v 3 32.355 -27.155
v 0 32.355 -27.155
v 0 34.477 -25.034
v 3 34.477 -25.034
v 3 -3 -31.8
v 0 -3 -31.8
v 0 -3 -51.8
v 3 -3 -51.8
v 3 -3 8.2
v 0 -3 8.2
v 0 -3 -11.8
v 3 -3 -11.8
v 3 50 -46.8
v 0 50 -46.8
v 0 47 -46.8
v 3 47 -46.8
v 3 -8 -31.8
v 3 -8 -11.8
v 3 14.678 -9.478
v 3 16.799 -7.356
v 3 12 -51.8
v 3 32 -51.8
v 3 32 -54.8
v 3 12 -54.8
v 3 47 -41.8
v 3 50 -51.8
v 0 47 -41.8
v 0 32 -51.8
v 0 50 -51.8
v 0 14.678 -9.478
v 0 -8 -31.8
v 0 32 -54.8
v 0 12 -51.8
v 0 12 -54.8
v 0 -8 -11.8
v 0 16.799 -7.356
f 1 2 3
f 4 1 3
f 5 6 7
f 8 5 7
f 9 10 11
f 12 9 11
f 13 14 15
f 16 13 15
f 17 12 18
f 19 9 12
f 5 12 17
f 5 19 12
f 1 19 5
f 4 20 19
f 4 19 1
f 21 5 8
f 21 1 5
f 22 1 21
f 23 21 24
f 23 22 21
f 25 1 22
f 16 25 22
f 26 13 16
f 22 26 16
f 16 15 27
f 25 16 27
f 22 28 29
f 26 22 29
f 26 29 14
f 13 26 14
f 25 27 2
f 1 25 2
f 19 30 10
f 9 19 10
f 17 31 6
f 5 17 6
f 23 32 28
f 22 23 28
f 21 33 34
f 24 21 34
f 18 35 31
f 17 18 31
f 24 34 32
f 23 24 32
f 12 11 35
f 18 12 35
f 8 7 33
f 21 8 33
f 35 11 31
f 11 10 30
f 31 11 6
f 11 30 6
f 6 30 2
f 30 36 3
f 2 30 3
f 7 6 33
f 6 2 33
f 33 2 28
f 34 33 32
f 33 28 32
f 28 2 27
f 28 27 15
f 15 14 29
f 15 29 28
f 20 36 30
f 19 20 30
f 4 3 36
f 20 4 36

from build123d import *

# Parameters (mm, degrees)
EXTRUDE_1_DEPTH = 3


with BuildPart() as part:
    # 스케치1 → 보스-돌출1 (new body)
    with BuildSketch(Plane(origin=(0, 0, 0), x_dir=(0, 0, -1), z_dir=(1, 0, 0))):
        Polygon((51.8, 32), (51.8, 47), (51.8, 50), (46.8, 50), (46.8, 47), (41.8, 47), (27.155339059, 32.355339059), (25.034018716, 34.476659403), (7.356349186, 16.798989873), (9.47766953, 14.67766953), (-8.2, -3), (11.8, -3), (11.8, -8), (31.8, -8), (31.8, -3), (51.8, -3), (51.8, 12), (54.8, 12), (54.8, 32), align=None)
    extrude(amount=EXTRUDE_1_DEPTH)


solid = part.part
